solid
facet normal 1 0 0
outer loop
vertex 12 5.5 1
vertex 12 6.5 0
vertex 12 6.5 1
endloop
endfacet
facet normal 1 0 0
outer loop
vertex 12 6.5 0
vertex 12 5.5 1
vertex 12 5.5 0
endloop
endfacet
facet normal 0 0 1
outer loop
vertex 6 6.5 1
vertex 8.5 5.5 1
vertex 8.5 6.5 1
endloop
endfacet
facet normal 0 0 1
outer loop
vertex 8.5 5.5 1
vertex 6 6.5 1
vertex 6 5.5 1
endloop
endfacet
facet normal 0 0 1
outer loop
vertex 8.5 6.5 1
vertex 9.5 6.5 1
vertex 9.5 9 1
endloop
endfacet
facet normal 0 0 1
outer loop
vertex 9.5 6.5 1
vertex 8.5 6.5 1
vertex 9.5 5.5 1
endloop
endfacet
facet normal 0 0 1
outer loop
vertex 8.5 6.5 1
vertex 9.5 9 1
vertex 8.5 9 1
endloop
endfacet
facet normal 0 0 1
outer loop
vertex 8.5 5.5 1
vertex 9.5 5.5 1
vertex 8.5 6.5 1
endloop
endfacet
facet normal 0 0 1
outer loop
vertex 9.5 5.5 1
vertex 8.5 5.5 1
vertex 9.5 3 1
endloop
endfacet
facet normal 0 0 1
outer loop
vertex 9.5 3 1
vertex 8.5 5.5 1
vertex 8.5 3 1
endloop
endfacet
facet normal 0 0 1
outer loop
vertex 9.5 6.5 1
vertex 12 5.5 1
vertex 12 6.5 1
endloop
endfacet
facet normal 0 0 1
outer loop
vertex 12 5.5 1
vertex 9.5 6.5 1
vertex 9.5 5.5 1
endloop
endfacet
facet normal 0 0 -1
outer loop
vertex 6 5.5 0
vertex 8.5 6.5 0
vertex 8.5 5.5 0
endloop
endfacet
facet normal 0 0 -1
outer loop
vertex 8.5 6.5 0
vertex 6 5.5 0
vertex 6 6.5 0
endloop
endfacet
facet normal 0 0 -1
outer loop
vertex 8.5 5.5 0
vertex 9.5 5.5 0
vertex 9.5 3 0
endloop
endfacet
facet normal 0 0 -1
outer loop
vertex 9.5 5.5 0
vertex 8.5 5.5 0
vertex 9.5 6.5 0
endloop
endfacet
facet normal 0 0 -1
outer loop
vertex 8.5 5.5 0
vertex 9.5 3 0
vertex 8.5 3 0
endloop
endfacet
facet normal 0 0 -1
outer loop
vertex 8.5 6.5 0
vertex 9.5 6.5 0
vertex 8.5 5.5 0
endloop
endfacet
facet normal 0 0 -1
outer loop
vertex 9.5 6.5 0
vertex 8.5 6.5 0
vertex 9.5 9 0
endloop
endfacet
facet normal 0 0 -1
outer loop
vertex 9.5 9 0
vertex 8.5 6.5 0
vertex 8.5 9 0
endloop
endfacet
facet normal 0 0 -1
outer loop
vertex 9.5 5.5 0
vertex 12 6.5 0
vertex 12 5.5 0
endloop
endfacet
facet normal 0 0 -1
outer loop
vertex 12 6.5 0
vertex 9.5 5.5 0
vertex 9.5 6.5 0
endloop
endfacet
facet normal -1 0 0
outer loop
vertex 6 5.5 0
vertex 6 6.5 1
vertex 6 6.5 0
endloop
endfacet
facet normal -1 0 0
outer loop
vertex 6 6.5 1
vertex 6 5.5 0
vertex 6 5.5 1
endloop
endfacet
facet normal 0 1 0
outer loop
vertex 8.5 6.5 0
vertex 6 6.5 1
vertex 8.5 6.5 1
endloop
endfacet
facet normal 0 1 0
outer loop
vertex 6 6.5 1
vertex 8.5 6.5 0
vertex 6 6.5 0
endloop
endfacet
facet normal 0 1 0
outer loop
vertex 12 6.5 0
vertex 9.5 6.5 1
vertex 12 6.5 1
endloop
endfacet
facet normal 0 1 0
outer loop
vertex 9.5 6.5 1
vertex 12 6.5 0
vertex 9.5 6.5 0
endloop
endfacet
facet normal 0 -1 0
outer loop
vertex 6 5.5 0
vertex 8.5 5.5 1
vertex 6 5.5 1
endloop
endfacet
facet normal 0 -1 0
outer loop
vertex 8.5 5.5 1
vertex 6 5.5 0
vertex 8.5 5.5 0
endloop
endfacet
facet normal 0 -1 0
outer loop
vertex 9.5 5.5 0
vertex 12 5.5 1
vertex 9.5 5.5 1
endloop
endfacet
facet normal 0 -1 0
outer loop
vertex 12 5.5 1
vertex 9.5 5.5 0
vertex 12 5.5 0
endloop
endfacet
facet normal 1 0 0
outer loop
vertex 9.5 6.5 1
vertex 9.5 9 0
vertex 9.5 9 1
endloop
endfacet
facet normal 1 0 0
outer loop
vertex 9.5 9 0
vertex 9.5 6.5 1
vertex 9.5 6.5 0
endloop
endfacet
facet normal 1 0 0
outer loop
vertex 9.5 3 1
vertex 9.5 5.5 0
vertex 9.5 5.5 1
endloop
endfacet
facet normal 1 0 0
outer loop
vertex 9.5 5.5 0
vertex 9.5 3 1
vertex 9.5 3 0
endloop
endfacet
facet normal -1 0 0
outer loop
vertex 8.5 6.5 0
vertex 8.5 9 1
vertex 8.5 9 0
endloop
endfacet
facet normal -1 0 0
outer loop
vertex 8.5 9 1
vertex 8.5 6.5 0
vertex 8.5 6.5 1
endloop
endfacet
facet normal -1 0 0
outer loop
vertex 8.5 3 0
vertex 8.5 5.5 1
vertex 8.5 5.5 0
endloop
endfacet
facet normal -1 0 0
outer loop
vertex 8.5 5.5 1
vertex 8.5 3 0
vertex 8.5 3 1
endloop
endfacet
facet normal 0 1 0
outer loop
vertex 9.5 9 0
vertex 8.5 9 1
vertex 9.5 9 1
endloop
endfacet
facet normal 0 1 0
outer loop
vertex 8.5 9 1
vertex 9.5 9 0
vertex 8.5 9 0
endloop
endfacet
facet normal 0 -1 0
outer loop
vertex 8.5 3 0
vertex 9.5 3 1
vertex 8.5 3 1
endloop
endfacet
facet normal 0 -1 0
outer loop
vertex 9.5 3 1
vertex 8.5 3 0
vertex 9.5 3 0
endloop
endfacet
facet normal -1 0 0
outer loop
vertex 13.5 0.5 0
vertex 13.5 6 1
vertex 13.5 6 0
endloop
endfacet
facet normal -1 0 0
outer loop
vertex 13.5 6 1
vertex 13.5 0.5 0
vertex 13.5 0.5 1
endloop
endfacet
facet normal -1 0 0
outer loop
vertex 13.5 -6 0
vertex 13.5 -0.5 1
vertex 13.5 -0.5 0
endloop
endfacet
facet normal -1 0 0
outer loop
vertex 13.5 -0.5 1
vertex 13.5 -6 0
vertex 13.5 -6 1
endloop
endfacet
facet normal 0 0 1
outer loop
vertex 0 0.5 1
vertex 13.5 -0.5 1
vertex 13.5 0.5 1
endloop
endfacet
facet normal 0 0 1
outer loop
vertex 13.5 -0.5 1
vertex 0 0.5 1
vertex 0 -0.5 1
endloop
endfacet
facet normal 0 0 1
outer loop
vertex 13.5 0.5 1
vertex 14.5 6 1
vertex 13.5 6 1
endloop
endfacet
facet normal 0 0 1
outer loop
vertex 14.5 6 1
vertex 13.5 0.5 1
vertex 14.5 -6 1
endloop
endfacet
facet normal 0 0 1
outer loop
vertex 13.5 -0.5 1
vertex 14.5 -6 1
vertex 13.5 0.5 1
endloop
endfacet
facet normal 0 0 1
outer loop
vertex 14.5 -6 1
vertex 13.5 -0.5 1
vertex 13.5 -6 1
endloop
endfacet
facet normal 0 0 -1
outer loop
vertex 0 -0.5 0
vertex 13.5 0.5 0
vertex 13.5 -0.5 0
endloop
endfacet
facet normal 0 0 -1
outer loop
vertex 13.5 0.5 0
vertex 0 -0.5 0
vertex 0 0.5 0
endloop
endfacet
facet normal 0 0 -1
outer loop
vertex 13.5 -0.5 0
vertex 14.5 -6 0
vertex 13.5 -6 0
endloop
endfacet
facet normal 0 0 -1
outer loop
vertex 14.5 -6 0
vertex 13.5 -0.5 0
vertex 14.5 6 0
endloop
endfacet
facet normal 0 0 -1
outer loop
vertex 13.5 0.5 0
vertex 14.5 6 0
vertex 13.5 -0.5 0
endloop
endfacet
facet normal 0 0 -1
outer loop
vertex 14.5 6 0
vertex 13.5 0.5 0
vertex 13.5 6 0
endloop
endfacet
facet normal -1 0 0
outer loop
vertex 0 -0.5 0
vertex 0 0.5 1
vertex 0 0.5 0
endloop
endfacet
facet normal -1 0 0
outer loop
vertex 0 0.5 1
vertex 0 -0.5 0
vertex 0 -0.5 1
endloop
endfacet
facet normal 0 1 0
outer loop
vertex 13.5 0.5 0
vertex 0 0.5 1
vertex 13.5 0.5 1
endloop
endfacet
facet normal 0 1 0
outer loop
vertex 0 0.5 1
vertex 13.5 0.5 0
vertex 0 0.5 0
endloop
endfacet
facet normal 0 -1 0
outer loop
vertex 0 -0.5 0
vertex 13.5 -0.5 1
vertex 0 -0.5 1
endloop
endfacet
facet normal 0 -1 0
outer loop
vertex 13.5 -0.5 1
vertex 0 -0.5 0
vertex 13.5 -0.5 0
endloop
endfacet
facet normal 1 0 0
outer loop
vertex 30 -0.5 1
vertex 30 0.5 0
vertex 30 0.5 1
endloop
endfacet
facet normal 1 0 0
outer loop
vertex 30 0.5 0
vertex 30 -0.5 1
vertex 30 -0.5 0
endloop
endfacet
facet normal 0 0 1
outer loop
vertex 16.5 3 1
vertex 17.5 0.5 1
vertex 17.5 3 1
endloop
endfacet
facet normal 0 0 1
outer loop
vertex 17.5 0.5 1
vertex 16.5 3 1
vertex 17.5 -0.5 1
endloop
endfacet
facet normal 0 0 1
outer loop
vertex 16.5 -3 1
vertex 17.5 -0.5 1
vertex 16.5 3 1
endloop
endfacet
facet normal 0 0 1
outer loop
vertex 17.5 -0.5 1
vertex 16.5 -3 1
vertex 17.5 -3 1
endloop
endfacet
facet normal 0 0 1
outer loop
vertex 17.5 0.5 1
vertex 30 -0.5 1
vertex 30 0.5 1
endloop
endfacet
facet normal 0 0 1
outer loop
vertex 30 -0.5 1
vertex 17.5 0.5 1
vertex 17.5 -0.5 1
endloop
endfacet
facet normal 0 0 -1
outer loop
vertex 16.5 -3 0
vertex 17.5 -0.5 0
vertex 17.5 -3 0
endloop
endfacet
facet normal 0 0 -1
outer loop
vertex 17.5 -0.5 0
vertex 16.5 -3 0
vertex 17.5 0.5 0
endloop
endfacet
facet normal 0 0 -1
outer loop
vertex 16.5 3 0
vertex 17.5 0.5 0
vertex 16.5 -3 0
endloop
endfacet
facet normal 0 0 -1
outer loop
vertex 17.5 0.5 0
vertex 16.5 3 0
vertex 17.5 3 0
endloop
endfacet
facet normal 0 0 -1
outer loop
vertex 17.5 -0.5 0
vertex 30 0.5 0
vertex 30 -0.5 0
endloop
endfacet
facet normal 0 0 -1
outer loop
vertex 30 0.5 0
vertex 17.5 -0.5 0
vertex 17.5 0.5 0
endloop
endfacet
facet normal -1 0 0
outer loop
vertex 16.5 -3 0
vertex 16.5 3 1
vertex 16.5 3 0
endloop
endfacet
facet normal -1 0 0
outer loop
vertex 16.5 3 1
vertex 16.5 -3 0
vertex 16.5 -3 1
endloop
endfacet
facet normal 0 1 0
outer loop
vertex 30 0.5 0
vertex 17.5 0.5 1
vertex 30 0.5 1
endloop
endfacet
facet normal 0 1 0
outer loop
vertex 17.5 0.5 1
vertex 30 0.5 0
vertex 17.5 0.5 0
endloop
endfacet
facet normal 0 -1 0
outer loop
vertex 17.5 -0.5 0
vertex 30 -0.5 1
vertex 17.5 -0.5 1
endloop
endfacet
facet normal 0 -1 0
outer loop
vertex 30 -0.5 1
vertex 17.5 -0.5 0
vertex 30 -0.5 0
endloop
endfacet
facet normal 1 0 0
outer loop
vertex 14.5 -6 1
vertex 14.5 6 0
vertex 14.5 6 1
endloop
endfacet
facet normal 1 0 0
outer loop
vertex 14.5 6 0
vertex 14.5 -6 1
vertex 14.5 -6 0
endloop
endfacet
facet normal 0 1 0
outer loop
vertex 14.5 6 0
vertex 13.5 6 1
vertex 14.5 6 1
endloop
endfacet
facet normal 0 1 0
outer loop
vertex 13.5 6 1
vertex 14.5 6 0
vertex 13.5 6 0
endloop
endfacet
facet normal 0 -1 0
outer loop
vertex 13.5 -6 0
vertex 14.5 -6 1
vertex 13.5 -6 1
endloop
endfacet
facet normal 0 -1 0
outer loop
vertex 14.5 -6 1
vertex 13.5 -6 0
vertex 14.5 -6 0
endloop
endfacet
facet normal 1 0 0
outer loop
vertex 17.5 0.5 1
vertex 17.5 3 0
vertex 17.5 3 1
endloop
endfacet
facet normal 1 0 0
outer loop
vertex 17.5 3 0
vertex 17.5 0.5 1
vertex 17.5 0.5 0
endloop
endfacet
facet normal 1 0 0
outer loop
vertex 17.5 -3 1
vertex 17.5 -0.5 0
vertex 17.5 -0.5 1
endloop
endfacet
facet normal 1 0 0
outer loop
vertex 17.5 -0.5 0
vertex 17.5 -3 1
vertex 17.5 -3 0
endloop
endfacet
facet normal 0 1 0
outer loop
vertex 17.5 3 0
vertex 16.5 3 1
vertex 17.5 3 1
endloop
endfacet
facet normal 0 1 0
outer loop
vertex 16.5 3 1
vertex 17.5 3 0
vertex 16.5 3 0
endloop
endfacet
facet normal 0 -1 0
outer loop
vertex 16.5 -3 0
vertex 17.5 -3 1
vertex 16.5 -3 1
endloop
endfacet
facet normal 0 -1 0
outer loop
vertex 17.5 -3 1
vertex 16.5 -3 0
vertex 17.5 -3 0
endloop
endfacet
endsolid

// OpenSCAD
// file: sym_plus.scad
module plus(size, thickness, height)
{
    translate([-size/2,-thickness/2, 0]) cube([size, thickness, height]);
    translate([-thickness/2,-size/2, 0]) cube([thickness, size, height]);
}
// main file
use <sym_plus.scad>

module battery(length, width, thickness, height)
{
    translate([0,-thickness/2,0])cube([length/2-width/8, thickness, height]);
    translate([(length/2+width/8),-thickness/2,0])cube([(length/2-width/8), thickness, height]);
    
    translate([(length-width/4)/2,-width/2, 0])cube([thickness, width, height]);
    translate([(length+width/4)/2,-width/4, 0])cube([thickness, width/2, height]);

    
    translate([length/2-width/2, 2*width/4,0]) plus(width/2, thickness, height);
}

battery(30, 12, 1, 1);
